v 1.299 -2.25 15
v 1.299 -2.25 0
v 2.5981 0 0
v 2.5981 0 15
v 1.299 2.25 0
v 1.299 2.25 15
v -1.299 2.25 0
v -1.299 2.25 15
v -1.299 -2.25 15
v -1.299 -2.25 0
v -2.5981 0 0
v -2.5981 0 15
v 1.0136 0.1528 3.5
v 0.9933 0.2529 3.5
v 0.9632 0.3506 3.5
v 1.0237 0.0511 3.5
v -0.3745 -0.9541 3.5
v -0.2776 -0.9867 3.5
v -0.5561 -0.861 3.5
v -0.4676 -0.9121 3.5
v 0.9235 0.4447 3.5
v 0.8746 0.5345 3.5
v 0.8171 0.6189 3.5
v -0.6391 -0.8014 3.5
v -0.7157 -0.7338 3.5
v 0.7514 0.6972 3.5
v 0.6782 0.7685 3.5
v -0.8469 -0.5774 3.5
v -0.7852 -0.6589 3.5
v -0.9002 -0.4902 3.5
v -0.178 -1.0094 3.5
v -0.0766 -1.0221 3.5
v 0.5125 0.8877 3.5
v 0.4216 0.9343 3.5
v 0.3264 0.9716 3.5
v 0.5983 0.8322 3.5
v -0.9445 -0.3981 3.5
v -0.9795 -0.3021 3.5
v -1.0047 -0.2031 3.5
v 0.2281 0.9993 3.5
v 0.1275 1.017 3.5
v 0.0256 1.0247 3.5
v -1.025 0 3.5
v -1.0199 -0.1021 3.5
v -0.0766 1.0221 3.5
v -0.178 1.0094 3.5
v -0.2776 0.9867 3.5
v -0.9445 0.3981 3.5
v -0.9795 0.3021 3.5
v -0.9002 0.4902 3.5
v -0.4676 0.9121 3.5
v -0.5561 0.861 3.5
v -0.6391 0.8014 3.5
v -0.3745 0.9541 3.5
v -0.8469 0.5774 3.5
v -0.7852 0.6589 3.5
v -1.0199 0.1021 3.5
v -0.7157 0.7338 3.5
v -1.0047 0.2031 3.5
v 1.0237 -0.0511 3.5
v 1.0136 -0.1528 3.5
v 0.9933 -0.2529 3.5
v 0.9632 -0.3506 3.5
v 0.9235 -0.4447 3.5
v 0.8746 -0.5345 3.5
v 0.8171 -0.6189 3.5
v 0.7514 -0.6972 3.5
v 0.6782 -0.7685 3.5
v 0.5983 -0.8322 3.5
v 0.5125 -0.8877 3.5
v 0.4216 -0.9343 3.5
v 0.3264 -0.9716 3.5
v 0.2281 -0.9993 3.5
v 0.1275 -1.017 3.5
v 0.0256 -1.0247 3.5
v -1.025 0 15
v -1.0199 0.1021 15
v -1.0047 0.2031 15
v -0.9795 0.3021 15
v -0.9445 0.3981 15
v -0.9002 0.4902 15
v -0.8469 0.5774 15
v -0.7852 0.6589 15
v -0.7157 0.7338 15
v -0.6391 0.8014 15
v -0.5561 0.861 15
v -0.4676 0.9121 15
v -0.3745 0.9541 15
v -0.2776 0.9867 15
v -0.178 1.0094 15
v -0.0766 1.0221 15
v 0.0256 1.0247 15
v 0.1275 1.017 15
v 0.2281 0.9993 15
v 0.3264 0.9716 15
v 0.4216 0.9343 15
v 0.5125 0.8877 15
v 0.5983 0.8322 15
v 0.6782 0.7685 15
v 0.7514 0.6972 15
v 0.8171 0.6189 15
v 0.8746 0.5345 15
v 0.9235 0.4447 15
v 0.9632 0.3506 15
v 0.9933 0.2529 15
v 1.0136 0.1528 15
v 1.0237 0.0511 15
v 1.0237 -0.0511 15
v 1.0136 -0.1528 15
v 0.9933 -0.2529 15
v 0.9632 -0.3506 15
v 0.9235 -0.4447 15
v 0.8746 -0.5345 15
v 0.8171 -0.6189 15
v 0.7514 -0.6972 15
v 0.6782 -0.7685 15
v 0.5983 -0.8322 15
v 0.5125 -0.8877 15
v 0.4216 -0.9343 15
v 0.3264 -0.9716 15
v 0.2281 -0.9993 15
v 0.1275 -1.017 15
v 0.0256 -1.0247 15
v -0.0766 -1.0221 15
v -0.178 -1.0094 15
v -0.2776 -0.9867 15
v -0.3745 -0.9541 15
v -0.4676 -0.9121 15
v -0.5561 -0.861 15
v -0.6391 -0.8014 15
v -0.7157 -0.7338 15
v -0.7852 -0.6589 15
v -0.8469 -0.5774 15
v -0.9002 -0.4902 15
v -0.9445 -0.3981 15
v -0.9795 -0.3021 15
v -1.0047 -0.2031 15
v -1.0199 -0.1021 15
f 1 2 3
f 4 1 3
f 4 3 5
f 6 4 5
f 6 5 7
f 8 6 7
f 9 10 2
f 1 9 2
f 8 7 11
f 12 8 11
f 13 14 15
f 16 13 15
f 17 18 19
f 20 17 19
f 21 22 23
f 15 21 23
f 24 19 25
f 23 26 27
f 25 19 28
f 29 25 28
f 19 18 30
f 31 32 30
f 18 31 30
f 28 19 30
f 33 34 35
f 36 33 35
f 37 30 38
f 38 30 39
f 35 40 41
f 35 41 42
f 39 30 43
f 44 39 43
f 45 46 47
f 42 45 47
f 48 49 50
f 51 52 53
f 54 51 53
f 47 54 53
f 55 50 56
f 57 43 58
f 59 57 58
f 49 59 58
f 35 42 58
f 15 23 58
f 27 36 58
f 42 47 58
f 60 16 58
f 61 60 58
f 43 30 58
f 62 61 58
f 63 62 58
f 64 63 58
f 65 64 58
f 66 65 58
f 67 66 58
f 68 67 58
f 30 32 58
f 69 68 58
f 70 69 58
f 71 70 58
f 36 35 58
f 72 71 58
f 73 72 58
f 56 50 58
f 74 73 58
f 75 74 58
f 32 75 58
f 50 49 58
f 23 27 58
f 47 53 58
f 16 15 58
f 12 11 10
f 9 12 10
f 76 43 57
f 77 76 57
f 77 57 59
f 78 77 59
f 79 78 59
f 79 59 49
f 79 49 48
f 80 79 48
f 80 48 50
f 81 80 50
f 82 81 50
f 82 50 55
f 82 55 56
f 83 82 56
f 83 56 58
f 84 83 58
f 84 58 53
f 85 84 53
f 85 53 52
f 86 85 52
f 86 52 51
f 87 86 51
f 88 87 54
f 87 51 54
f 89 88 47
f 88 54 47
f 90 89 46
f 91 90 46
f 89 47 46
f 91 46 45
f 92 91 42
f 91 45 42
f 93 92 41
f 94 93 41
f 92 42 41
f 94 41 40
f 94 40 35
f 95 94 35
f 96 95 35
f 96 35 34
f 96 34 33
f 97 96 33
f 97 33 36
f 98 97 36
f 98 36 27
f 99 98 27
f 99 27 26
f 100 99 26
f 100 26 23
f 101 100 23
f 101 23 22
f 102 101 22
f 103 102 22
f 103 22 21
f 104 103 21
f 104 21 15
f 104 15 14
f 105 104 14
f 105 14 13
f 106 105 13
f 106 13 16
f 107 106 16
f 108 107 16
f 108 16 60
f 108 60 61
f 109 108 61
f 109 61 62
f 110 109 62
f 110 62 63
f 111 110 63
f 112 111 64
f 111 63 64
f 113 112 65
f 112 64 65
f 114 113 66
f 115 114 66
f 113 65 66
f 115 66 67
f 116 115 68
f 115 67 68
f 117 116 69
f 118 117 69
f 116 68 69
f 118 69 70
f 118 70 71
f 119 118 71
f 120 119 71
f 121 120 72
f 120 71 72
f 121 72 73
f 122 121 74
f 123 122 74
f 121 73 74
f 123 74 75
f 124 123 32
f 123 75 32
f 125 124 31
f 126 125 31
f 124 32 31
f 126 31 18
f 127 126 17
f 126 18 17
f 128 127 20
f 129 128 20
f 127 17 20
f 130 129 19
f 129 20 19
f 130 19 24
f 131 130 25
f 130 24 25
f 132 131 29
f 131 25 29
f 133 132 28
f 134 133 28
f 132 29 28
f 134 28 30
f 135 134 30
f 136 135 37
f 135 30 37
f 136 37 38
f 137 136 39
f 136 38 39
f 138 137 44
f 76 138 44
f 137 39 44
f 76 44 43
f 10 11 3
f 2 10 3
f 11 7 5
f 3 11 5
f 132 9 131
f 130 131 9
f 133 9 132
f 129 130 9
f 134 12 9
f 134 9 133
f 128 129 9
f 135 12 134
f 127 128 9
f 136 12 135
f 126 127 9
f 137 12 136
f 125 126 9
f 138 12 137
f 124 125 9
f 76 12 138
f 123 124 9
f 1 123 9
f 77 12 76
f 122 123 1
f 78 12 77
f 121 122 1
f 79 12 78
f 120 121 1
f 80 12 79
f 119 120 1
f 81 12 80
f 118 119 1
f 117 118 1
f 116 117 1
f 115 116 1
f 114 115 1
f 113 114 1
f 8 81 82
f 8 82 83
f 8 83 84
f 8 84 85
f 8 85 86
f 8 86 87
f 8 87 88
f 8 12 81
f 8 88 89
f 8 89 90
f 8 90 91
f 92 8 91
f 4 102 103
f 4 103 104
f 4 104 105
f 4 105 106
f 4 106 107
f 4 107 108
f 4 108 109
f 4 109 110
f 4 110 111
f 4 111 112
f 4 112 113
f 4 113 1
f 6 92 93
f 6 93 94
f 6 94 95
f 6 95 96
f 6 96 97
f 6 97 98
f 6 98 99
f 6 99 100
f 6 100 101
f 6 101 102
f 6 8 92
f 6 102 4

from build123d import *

# Parameters (mm, degrees)
BOSS_EXTRUDE1_DEPTH           = 15
TAP_DRILL_FOR_M2_5_TAP1_D     = 2.05
TAP_DRILL_FOR_M2_5_TAP1_DEPTH = 11.5


with BuildPart() as part:
    # Sketch1 → Boss-Extrude1 (new body)
    with BuildSketch(Plane.XY):
        Polygon((-1.299038106, 2.25), (-2.598076211, 0), (-1.299038106, -2.25), (1.299038106, -2.25), (2.598076211, 0), (1.299038106, 2.25), align=None)
    extrude(amount=BOSS_EXTRUDE1_DEPTH)

    # Tap Drill for M2.5 Tap1
    with Locations(Plane.XY.offset(15)):
        with Locations((0, 0)):
            Hole(TAP_DRILL_FOR_M2_5_TAP1_D / 2, depth=TAP_DRILL_FOR_M2_5_TAP1_DEPTH)


solid = part.part
